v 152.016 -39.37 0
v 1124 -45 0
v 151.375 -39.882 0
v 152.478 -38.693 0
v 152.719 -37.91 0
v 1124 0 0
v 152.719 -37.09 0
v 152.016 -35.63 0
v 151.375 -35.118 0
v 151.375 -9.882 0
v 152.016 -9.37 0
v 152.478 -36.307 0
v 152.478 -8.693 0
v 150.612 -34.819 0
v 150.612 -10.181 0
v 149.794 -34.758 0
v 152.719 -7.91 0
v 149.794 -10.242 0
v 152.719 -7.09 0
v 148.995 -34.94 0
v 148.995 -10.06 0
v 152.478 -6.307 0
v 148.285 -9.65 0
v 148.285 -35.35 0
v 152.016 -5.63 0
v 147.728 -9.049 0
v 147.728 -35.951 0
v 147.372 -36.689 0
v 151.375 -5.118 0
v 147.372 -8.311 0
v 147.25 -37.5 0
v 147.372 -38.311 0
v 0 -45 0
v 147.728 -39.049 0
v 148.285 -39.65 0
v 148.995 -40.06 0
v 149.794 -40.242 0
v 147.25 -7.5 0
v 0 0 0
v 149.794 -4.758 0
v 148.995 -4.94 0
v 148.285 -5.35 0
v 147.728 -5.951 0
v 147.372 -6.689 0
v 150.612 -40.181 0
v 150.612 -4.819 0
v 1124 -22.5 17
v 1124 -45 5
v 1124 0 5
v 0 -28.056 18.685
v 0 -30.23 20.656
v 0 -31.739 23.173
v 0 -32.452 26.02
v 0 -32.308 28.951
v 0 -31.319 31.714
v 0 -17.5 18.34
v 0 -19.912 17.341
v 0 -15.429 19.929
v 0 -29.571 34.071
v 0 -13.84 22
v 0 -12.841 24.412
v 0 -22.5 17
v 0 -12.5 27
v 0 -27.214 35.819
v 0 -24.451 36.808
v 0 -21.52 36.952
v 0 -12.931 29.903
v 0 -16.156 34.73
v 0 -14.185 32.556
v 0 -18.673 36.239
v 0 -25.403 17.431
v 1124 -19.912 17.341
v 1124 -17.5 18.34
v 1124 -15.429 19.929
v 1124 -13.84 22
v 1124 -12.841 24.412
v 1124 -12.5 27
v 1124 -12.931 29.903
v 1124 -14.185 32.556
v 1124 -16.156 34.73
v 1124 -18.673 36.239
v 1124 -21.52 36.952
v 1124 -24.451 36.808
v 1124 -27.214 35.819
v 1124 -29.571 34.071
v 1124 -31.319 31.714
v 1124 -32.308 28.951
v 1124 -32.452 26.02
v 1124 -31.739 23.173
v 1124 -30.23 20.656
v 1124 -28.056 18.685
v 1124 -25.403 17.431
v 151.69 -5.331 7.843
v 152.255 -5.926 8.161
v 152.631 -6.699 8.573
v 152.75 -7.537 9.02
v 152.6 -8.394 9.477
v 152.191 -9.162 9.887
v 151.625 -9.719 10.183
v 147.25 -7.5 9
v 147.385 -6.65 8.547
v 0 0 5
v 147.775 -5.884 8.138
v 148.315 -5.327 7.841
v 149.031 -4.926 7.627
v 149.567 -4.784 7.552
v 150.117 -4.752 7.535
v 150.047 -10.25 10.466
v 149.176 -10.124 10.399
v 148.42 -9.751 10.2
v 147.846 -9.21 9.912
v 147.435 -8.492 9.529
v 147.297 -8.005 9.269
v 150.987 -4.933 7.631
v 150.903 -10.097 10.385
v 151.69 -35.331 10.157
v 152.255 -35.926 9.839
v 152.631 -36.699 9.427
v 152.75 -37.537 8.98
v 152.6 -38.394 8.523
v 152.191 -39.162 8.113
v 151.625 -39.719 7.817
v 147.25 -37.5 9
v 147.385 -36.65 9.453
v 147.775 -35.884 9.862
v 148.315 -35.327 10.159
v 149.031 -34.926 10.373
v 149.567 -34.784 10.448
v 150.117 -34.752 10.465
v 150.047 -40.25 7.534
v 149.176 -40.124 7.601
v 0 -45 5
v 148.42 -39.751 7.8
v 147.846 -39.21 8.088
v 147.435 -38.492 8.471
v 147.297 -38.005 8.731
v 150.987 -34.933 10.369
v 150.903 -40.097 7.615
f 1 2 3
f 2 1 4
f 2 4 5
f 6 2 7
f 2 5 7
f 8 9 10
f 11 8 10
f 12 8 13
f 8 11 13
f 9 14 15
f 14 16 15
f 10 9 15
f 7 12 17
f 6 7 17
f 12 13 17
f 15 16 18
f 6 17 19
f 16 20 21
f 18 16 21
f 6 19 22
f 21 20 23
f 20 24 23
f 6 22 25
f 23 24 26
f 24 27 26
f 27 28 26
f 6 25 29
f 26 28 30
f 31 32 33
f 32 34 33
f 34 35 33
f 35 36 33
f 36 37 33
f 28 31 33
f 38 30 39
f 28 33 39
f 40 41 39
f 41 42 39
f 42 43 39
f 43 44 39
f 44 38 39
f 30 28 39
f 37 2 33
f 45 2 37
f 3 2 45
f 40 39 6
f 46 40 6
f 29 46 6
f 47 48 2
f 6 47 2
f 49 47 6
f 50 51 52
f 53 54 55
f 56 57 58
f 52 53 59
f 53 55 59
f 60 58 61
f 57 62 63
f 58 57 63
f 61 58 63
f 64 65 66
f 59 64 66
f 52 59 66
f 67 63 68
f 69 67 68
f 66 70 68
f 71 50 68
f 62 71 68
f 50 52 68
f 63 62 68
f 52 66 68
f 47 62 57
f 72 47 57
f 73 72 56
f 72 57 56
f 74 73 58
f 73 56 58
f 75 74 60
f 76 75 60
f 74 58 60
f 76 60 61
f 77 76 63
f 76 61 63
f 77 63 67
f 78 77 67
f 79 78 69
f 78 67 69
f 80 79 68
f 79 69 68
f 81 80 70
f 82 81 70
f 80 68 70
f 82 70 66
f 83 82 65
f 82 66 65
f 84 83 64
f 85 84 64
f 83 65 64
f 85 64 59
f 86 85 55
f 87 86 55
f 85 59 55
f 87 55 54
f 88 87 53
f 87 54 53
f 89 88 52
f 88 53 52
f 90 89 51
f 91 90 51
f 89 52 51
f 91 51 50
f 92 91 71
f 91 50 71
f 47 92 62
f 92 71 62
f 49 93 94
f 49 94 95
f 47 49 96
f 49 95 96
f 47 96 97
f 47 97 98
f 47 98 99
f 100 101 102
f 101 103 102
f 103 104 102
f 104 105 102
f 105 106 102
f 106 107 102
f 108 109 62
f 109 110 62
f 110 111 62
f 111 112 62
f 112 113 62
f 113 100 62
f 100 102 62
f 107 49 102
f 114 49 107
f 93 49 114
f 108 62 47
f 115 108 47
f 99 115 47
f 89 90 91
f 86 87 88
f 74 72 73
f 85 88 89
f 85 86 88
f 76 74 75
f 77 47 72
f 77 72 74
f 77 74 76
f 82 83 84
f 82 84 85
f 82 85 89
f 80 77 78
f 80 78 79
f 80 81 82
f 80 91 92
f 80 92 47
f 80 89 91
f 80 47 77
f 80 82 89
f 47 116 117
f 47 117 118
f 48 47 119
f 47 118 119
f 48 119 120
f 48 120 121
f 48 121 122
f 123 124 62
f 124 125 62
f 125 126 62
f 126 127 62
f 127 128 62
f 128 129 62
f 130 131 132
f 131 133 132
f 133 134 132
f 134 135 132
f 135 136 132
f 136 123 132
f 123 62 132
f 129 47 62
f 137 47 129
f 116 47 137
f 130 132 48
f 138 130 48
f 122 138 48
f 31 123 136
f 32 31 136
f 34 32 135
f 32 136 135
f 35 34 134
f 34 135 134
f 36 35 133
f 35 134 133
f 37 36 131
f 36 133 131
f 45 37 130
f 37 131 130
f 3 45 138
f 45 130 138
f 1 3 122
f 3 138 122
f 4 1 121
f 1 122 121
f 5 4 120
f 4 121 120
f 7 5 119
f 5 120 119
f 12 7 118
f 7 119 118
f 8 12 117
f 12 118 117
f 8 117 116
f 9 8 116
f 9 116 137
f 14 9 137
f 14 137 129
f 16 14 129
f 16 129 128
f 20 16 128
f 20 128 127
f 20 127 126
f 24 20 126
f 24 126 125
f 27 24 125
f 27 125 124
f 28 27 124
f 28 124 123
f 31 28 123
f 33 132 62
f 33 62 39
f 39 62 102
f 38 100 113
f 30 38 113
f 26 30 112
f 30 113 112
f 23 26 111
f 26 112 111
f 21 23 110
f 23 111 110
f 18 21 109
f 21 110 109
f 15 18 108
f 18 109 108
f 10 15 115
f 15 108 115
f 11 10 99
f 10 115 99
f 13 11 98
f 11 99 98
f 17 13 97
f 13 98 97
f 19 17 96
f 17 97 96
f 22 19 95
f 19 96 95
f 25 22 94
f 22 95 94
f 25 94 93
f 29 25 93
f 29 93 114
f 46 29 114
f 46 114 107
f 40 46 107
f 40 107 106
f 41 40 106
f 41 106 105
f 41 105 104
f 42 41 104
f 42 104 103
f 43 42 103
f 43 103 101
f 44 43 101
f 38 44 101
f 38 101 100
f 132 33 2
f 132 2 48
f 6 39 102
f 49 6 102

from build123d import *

# Parameters (mm, degrees)
F0_W     = 45
F0_H     = 5
F1_DEPTH = 1124
F3_D     = 5.5


with BuildPart() as f1:
    # F0 (on Right) → F1 (new body)
    with BuildSketch(Plane.YZ):
        with Locations((-22.5, 2.5)):
            Rectangle(F0_W, F0_H)
        Polygon((-45, 5), (0, 5), (-22.5, 17), align=None)
    extrude(amount=F1_DEPTH)

    # F3 (through all)
    with Locations(Plane(origin=(0, 0, 0), x_dir=(1, 0, 0), z_dir=(0, 0, -1))):
        with Locations((150, 37.5), (150, 7.5)):
            Hole(F3_D / 2)


with BuildPart() as f1b:
    # F0 (on Right) → F1, piece 2 (new body)
    with BuildSketch(Plane.YZ):
        with BuildLine():
            ThreePointArc((-12.5, 27), (-29.5710678119, 34.0710678119), (-22.5, 17))
            ThreePointArc((-22.5, 17), (-15.4289321881, 19.9289321881), (-12.5, 27))
        make_face()
    extrude(amount=F1_DEPTH)


solid = Compound([f1.part, f1b.part])
